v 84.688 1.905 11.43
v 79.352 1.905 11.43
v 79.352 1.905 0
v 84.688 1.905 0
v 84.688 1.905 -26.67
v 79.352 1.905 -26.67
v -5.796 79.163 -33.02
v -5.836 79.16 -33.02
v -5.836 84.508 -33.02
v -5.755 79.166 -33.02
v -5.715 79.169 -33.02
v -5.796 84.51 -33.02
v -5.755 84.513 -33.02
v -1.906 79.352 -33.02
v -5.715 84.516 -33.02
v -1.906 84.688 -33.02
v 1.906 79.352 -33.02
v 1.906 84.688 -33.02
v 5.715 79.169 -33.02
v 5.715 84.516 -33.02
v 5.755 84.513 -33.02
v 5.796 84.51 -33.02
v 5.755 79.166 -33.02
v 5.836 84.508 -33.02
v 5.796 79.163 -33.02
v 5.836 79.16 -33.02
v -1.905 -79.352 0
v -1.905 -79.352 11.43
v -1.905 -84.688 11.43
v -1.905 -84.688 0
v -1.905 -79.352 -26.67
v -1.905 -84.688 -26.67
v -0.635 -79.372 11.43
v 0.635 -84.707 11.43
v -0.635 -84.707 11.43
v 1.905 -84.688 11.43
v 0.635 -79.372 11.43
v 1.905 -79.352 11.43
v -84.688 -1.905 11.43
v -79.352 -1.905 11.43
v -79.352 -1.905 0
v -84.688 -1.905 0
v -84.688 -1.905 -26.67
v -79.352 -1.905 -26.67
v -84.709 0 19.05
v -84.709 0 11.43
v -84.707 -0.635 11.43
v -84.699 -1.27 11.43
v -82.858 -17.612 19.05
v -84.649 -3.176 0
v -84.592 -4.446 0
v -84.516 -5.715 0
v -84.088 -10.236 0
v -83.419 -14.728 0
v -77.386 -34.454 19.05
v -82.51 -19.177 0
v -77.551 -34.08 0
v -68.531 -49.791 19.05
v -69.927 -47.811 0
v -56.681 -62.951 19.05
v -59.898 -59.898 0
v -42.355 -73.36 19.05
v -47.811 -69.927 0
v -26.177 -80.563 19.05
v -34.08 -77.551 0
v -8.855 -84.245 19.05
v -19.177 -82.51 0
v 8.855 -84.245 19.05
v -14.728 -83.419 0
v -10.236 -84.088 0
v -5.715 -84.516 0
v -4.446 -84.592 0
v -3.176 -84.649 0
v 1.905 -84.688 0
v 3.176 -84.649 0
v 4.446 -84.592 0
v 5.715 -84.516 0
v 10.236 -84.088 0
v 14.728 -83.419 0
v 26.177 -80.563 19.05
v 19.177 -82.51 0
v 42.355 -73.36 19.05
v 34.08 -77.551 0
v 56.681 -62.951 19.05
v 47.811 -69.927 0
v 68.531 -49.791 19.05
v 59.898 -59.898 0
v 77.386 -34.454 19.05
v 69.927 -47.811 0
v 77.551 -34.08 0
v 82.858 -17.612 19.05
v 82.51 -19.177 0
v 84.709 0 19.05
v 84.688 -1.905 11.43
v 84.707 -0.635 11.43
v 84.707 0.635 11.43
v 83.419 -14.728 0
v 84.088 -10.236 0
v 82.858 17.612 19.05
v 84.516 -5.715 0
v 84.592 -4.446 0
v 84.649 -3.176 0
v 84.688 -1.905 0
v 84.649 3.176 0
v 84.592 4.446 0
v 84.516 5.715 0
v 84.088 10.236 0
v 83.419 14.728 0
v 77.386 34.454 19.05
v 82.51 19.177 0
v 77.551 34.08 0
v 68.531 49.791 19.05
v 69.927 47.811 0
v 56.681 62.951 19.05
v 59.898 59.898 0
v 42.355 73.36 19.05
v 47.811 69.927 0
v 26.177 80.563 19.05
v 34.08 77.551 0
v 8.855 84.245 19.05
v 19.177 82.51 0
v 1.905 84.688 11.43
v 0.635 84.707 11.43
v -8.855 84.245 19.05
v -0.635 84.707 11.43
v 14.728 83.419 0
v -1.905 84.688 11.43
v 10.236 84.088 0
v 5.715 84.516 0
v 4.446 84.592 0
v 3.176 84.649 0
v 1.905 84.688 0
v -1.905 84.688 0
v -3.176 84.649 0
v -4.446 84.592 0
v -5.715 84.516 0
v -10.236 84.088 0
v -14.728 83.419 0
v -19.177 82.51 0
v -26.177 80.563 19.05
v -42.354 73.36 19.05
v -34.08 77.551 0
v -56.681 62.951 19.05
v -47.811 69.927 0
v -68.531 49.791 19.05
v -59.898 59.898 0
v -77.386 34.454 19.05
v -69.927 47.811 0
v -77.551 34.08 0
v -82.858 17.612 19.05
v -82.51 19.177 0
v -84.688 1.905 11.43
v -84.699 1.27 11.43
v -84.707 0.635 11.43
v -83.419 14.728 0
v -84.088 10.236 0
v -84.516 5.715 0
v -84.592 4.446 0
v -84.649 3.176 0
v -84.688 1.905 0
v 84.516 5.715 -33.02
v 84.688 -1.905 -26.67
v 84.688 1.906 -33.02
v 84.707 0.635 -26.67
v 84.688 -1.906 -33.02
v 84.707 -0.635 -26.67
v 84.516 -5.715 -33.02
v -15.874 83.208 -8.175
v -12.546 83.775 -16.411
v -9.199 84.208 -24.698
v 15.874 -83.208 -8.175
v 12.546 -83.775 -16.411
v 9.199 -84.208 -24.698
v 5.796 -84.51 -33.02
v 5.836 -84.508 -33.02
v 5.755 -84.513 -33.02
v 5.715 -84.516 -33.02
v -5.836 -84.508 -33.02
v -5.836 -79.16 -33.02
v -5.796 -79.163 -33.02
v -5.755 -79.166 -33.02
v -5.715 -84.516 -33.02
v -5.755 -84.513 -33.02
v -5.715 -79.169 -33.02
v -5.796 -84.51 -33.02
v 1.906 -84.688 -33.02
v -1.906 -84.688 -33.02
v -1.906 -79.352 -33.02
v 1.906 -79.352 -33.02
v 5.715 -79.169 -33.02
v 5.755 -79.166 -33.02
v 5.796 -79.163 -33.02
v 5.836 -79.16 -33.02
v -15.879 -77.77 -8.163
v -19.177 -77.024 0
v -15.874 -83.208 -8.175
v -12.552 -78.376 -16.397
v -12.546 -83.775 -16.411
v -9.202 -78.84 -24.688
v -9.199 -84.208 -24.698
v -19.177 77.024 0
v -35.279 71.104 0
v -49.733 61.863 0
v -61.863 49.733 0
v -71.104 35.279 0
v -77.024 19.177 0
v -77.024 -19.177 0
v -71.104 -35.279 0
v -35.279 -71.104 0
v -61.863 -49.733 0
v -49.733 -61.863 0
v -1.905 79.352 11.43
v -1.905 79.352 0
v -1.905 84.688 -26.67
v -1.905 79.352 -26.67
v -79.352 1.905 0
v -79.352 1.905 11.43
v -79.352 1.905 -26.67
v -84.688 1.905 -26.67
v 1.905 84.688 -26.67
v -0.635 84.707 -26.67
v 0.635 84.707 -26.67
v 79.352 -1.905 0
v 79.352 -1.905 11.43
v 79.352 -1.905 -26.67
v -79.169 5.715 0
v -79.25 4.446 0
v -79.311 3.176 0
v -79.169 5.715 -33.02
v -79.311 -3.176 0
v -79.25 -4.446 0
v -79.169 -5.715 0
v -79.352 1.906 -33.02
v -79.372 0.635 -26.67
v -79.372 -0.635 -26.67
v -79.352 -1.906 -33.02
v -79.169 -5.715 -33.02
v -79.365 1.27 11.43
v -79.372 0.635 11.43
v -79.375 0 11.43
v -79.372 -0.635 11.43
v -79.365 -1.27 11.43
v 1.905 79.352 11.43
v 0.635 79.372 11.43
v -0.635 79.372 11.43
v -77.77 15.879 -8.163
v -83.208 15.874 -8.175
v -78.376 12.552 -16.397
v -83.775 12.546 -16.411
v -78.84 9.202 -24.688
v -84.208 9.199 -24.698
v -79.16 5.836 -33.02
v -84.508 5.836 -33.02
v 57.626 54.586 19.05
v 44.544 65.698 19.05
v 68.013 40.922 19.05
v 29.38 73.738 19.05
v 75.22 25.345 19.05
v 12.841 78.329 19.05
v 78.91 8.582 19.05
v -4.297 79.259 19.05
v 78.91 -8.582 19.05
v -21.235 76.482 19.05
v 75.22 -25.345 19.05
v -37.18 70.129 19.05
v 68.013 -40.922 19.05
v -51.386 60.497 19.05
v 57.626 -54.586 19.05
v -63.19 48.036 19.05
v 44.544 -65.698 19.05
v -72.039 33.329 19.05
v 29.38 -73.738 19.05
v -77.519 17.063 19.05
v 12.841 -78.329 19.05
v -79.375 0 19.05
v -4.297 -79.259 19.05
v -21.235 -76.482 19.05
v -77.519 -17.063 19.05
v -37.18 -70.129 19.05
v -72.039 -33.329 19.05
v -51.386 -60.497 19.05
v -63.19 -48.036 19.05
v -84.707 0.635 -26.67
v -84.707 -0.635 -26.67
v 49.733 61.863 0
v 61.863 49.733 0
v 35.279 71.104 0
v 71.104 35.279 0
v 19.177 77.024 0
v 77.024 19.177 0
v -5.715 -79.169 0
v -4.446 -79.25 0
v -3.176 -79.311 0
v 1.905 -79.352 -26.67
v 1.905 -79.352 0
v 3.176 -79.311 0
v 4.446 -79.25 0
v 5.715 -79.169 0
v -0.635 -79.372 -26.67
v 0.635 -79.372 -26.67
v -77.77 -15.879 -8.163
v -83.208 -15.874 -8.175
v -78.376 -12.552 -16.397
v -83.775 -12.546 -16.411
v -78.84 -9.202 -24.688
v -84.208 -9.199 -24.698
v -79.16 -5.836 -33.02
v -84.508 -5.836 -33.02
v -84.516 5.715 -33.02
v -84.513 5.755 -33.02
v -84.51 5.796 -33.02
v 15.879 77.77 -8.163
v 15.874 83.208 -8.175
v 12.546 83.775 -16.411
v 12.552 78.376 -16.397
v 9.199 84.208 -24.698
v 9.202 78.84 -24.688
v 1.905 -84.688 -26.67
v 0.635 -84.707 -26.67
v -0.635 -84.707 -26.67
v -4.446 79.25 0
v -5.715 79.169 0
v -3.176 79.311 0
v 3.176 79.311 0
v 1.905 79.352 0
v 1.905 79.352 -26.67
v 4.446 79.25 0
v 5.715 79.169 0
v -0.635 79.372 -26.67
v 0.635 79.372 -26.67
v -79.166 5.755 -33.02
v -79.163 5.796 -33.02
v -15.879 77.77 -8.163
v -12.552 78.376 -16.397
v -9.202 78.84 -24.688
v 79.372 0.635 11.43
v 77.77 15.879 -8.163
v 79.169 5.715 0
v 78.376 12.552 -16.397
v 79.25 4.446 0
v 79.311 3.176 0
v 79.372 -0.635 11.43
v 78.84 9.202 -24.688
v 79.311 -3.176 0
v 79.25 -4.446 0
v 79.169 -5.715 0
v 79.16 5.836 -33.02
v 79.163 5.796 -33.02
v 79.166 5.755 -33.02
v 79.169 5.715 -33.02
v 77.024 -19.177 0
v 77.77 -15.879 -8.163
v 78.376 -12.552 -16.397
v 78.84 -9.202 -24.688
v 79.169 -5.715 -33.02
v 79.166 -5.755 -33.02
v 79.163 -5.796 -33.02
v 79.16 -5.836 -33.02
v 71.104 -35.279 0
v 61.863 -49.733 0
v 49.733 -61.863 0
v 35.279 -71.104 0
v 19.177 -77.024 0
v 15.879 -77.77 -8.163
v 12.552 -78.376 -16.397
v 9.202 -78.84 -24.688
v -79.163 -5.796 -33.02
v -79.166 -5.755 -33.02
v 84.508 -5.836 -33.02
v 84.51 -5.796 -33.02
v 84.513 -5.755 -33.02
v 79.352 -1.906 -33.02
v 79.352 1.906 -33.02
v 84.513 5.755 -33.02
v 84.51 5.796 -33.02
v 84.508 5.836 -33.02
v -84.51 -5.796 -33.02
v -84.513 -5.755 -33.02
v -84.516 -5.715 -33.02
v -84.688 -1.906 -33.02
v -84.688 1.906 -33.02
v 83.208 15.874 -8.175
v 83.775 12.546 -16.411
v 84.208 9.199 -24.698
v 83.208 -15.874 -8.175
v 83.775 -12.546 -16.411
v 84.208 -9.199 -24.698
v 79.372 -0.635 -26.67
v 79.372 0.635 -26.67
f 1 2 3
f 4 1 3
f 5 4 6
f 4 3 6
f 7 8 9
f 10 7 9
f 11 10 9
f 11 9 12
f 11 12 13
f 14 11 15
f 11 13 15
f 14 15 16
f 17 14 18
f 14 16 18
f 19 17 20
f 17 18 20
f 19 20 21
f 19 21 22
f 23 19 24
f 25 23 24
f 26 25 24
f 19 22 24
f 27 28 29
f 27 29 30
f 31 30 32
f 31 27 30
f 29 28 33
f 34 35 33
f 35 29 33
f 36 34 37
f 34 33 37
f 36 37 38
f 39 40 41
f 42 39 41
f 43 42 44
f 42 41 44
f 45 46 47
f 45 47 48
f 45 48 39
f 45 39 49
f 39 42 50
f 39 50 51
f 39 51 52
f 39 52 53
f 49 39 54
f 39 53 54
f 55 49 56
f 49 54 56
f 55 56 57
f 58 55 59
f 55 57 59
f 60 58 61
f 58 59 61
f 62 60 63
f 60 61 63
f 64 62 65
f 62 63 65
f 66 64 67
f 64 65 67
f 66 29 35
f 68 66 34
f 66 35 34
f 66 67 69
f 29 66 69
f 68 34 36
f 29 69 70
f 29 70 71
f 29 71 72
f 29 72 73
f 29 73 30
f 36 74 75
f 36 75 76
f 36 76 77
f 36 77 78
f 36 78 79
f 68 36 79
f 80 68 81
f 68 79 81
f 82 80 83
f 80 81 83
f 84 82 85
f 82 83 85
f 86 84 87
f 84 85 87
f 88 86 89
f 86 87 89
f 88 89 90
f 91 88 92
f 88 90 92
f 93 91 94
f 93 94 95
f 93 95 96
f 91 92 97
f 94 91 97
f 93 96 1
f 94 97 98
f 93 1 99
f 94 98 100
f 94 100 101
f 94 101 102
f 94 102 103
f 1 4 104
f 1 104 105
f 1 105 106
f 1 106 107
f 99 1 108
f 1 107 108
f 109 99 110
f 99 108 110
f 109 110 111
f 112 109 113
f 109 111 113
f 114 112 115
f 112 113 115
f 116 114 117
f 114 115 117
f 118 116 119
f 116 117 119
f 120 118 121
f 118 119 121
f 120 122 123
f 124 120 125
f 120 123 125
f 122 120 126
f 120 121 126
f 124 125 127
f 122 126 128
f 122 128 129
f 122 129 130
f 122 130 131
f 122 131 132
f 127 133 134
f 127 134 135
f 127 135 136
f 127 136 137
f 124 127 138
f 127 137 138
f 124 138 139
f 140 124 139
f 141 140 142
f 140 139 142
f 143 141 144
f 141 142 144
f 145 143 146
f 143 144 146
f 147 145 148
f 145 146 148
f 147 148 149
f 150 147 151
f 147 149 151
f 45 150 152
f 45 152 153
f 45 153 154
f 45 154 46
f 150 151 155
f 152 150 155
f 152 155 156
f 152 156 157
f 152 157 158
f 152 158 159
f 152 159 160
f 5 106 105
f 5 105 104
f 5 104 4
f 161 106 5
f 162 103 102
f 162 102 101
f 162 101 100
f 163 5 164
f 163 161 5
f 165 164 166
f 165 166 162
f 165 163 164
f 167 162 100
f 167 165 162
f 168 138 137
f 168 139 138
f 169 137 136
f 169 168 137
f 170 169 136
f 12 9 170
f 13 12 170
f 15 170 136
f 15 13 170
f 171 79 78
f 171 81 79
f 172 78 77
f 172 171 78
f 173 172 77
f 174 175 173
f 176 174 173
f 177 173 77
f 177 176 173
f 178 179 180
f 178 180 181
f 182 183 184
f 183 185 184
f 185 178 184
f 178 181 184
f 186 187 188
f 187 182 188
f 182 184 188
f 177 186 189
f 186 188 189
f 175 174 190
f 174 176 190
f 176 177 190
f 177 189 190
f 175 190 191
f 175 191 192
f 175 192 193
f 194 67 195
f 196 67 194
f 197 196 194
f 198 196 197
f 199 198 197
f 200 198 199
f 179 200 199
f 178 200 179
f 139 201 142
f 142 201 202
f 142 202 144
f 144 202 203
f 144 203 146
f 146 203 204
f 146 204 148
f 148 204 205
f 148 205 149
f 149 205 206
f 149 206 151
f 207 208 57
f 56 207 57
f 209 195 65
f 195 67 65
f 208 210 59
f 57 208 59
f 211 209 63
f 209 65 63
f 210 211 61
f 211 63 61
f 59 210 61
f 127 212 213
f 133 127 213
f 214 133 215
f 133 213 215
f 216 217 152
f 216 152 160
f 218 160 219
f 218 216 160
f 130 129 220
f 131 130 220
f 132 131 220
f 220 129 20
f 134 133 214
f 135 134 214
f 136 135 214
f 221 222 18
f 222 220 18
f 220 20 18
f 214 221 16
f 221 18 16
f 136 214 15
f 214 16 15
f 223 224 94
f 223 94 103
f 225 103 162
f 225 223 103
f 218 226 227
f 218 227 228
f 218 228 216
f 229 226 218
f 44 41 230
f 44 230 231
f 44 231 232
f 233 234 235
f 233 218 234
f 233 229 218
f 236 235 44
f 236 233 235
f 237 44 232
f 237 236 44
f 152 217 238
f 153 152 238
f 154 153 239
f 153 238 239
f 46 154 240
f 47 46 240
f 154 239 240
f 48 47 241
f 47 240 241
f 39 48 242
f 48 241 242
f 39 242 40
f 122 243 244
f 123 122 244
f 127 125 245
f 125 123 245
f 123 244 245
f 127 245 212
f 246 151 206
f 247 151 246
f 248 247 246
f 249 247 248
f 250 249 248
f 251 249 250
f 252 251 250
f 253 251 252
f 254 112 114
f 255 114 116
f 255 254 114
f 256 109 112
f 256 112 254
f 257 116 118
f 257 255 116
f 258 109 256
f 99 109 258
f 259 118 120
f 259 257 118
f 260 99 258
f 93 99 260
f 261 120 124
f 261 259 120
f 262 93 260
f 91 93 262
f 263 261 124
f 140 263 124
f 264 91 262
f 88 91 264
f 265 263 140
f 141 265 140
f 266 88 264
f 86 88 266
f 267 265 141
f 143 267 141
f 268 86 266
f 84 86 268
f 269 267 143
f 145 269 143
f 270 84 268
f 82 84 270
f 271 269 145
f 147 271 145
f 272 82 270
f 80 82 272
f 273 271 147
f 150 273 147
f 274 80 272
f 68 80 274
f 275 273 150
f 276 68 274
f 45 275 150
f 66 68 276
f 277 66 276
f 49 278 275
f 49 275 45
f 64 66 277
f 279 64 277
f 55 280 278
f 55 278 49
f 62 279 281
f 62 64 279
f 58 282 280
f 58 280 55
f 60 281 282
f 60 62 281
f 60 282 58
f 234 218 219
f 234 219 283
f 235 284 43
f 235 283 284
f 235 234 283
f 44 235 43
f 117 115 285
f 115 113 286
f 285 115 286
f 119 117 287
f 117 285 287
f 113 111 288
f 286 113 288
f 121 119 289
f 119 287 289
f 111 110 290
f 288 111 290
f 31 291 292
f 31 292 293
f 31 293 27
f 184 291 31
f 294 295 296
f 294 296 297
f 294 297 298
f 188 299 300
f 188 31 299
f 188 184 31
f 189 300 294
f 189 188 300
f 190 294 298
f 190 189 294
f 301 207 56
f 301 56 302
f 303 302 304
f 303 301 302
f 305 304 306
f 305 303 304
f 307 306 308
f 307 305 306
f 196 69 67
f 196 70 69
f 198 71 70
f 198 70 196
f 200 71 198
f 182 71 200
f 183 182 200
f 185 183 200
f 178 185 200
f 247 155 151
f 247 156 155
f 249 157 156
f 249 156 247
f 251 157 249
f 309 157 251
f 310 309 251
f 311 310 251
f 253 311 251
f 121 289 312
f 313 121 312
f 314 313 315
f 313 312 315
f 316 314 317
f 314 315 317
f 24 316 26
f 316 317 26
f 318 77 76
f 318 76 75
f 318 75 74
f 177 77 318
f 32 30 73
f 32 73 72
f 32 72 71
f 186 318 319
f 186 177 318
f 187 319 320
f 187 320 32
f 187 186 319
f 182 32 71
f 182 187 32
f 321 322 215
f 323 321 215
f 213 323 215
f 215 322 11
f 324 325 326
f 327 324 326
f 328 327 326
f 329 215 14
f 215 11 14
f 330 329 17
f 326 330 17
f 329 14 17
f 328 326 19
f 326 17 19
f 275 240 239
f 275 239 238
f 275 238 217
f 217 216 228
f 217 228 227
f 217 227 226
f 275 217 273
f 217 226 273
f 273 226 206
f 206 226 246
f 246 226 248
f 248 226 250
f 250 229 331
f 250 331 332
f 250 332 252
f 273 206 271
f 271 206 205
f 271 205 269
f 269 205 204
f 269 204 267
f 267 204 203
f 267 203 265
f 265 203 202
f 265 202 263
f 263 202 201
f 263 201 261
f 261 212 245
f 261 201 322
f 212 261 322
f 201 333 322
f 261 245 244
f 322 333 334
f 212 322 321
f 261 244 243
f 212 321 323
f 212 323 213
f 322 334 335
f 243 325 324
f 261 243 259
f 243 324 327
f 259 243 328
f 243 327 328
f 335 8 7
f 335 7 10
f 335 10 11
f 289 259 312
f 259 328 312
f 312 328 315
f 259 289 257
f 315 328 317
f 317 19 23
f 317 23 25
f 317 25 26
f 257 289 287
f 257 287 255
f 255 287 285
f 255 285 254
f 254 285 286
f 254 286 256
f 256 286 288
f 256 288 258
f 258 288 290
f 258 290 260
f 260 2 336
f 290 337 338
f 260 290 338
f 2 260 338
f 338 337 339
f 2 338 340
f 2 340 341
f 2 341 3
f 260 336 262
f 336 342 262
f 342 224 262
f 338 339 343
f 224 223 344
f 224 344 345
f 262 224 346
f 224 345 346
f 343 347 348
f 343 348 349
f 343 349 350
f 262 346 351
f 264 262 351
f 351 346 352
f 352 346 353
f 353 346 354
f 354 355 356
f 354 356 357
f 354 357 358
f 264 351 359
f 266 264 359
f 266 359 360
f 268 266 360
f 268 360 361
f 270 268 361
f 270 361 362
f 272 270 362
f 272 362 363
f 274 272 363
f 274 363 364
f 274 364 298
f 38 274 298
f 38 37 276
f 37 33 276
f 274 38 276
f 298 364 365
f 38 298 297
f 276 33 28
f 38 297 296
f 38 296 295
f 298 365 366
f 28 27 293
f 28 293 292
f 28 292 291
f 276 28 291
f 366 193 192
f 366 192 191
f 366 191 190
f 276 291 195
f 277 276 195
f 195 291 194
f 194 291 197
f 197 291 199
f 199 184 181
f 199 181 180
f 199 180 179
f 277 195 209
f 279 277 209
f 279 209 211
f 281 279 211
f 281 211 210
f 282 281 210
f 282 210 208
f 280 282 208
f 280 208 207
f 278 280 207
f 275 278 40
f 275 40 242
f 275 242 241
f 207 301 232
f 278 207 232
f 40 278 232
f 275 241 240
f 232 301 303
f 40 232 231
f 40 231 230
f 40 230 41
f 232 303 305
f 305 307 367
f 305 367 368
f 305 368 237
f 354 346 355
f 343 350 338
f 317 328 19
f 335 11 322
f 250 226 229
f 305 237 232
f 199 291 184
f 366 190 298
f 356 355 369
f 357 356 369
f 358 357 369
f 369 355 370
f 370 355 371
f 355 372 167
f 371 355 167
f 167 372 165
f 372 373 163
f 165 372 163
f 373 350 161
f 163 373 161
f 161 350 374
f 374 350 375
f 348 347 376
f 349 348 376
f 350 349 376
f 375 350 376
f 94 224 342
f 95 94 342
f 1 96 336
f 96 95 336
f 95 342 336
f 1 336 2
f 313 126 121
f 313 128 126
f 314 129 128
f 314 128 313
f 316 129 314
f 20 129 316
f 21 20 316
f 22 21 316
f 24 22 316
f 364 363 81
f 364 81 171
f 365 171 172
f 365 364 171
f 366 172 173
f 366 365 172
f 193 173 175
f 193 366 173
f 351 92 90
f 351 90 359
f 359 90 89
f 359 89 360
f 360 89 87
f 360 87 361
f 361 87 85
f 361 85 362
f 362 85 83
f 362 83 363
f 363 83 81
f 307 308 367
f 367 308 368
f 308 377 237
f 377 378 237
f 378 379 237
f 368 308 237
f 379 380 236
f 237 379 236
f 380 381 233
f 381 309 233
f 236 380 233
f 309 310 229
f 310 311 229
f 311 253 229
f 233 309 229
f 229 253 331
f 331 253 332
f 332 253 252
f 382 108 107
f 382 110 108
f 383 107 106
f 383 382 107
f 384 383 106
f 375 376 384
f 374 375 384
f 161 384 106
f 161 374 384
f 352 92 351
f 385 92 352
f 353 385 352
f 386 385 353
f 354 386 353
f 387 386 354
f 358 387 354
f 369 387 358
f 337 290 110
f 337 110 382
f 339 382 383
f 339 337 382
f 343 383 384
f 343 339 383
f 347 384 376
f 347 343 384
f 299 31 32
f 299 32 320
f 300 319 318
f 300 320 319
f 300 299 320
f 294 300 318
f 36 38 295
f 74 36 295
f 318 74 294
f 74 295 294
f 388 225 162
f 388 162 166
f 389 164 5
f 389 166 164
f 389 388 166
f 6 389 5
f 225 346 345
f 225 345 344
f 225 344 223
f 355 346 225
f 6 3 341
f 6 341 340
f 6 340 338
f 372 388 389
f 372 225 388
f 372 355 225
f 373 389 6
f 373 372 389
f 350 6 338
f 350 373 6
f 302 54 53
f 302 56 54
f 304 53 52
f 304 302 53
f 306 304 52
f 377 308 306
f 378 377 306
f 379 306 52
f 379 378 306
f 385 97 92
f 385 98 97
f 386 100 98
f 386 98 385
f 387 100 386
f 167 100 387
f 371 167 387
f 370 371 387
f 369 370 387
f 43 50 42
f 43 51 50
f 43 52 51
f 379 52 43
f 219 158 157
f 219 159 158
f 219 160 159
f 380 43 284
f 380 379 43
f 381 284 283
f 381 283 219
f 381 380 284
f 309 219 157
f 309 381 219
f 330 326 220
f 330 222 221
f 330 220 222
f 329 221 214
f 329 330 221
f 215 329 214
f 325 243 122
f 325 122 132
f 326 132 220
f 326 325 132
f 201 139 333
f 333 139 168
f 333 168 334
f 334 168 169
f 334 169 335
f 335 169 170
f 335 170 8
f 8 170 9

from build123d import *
from build123d.topology import SkipClean

# Parameters (mm, degrees)
SKETCH1_R           = 84.709
SKETCH1_R_2         = 79.375
BOSS_EXTRUDE1_DEPTH = 19.05
BOSS_EXTRUDE2_START = 33.02
BOSS_EXTRUDE2_DEPTH = 33.02
SKETCH2_W           = 3.81
SKETCH2_H           = 38.1
CUT_EXTRUDE1_DEPTH  = 125.264032455
CIRPATTERN1_COUNT   = 4
CHAMFER1_SIZE       = 13.462
CHAMFER1_SIZE_2     = 33.319619221


with BuildPart() as part:
    # Sketch1 → Boss-Extrude1 (new body)
    with BuildSketch(Plane.XY):
        with Locations(Location((0, 0, 0), (0, 0, 180))):
            Circle(SKETCH1_R)
        with Locations(Location((0, 0, 0), (0, 0, 180))):
            Circle(SKETCH1_R_2, mode=Mode.SUBTRACT)
    extrude(amount=BOSS_EXTRUDE1_DEPTH)

    # Sketch3 → Boss-Extrude2 (add)
    with SkipClean():  # the faces are left unmerged after this step: merging them gives an invalid solid
        with BuildSketch(Plane(origin=(0, 0, 0), x_dir=(-1, 0, 0), z_dir=(0, 0, -1)).offset(BOSS_EXTRUDE2_START)):
            with BuildLine():
                Line((-5.715, 79.168992668), (-5.715, 84.515995267))
                ThreePointArc((-5.715, 84.515995267), (0, 84.709), (5.715, 84.515995267))
                Line((5.715, 84.515995267), (5.715, 79.168992668))
                ThreePointArc((5.715, 79.168992668), (0, 79.375), (-5.715, 79.168992668))
            make_face()
            with BuildLine():
                Line((-5.715, -79.168992668), (-5.715, -84.515995267))
                ThreePointArc((-5.715, -84.515995267), (0, -84.709), (5.715, -84.515995267))
                Line((5.715, -84.515995267), (5.715, -79.168992668))
                ThreePointArc((5.715, -79.168992668), (0, -79.375), (-5.715, -79.168992668))
            make_face()
            with BuildLine():
                Line((79.168992668, -5.715), (84.515995267, -5.715))
                ThreePointArc((84.515995267, -5.715), (84.709, 0), (84.515995267, 5.715))
                Line((84.515995267, 5.715), (79.168992668, 5.715))
                ThreePointArc((79.168992668, 5.715), (79.375, 0), (79.168992668, -5.715))
            make_face()
            with BuildLine():
                Line((-79.168992668, 5.715), (-84.515995267, 5.715))
                ThreePointArc((-84.515995267, 5.715), (-84.709, 0), (-84.515995267, -5.715))
                Line((-84.515995267, -5.715), (-79.168992668, -5.715))
                ThreePointArc((-79.168992668, -5.715), (-79.375, 0), (-79.168992668, 5.715))
            make_face()
        extrude(amount=-BOSS_EXTRUDE2_DEPTH)

    # Sketch2 → Cut-Extrude1 (cut, through all)
    with SkipClean():  # the faces are left unmerged after this step: merging them gives an invalid solid
        with BuildSketch(Plane(origin=(0, 0, 0), x_dir=(1, 0, 0), z_dir=(0, 1, 0))):
            with Locations((0, 7.62)):
                Rectangle(SKETCH2_W, SKETCH2_H)
        cut_extrude1 = extrude(amount=-CUT_EXTRUDE1_DEPTH, mode=Mode.SUBTRACT)

    # CirPattern1: Cut-Extrude1 ×4 about axis
    with SkipClean():  # the faces are left unmerged after this step: merging them gives an invalid solid
        cirpattern1_axis = Axis((0, 0, 0), (0, 0, 1))
        for i in range(1, CIRPATTERN1_COUNT):
            add(cut_extrude1.rotate(cirpattern1_axis, i * 360 / CIRPATTERN1_COUNT), mode=Mode.SUBTRACT)

    # Chamfer1
    # the kernel refuses this chamfer: 33.319619221, 13.462 mm, written as the material it adds along each edge
    with BuildSketch(Plane(origin=(-5.715, 170.913401218, 0), x_dir=(-0.9961057015681392, 0, 0.08816706473193561), z_dir=(0, -1, 0))) as chamfer1_piece_1_section:
        Polygon((CHAMFER1_SIZE * 0.996105701568, CHAMFER1_SIZE * 0.0881670647319), (-CHAMFER1_SIZE_2 * 0.0881670647311, CHAMFER1_SIZE_2 * 0.996105701559), (0, 0), align=None)
    chamfer1_piece_1 = extrude(amount=178.141814502, mode=Mode.PRIVATE)
    chamfer1_piece_1 = chamfer1_piece_1 & Plane(origin=(0, 0, -11.191625659), x_dir=(-1, 0, 0), z_dir=(0, 0, -1)) * Cylinder(84.709, 490, mode=Mode.PRIVATE)
    chamfer1_piece_1 = chamfer1_piece_1 - Plane(origin=(0, 0, -11.191625659), x_dir=(-1, 0, 0), z_dir=(0, 0, -1)) * Cylinder(79.375, 490, mode=Mode.PRIVATE)
    chamfer1_piece_1 = split(chamfer1_piece_1, bisect_by=Plane(origin=(-9.949714127, 81.358468366, -33.02), z_dir=(0, 0, 1)), keep=Keep.TOP, mode=Mode.PRIVATE)
    add(chamfer1_piece_1)
    with BuildSketch(Plane(origin=(-170.913401218, 5.715, 0), x_dir=(1.3071407043529467e-14, 0.9961057015681392, 0.08816706473193561), z_dir=(1, 0, 0))) as chamfer1_piece_2_section:
        Polygon((CHAMFER1_SIZE * 0.996105701568, -CHAMFER1_SIZE * 0.0881670647319), (-CHAMFER1_SIZE_2 * 0.0881670647311, -CHAMFER1_SIZE_2 * 0.996105701559), (0, 0), align=None)
    chamfer1_piece_2 = extrude(amount=178.141814502, mode=Mode.PRIVATE)
    chamfer1_piece_2 = chamfer1_piece_2 & Plane(origin=(0, 0, -11.191625637), x_dir=(-1, 0, 0), z_dir=(0, 0, -1)) * Cylinder(84.709, 490, mode=Mode.PRIVATE)
    chamfer1_piece_2 = chamfer1_piece_2 - Plane(origin=(0, 0, -11.191625637), x_dir=(-1, 0, 0), z_dir=(0, 0, -1)) * Cylinder(79.375, 490, mode=Mode.PRIVATE)
    chamfer1_piece_2 = split(chamfer1_piece_2, bisect_by=Plane(origin=(-81.358468349, 9.949714129, -33.02), z_dir=(0, 0, 1)), keep=Keep.TOP, mode=Mode.PRIVATE)
    add(chamfer1_piece_2)
    with BuildSketch(Plane(origin=(5.715, -7.228413283, 0), x_dir=(0.9961057015681392, 0, 0.08816706473193561), z_dir=(0, 1, 0))) as chamfer1_piece_3_section:
        Polygon((CHAMFER1_SIZE * 0.996105701568, CHAMFER1_SIZE * 0.0881670647319), (-CHAMFER1_SIZE_2 * 0.0881670647311, CHAMFER1_SIZE_2 * 0.996105701559), (0, 0), align=None)
    chamfer1_piece_3 = extrude(amount=178.141814502, mode=Mode.PRIVATE)
    chamfer1_piece_3 = chamfer1_piece_3 & Plane(origin=(0, 0, -11.191625637), x_dir=(-1, 0, 0), z_dir=(0, 0, -1)) * Cylinder(84.709, 490, mode=Mode.PRIVATE)
    chamfer1_piece_3 = chamfer1_piece_3 - Plane(origin=(0, 0, -11.191625637), x_dir=(-1, 0, 0), z_dir=(0, 0, -1)) * Cylinder(79.375, 490, mode=Mode.PRIVATE)
    chamfer1_piece_3 = split(chamfer1_piece_3, bisect_by=Plane(origin=(9.949714129, 81.358468349, -33.02), z_dir=(0, 0, 1)), keep=Keep.TOP, mode=Mode.PRIVATE)
    add(chamfer1_piece_3)
    with BuildSketch(Plane(origin=(-7.228413283, 5.715, 0), x_dir=(-1.3071407043529467e-14, 0.9961057015681392, 0.08816706473193563), z_dir=(1, 0, 0))) as chamfer1_piece_4_section:
        Polygon((CHAMFER1_SIZE * 0.996105701568, -CHAMFER1_SIZE * 0.0881670647319), (-CHAMFER1_SIZE_2 * 0.0881670647311, -CHAMFER1_SIZE_2 * 0.996105701559), (0, 0), align=None)
    chamfer1_piece_4 = extrude(amount=178.141814502, mode=Mode.PRIVATE)
    chamfer1_piece_4 = chamfer1_piece_4 & Plane(origin=(0, 0, -11.191625658), x_dir=(-1, 0, 0), z_dir=(0, 0, -1)) * Cylinder(84.709, 490, mode=Mode.PRIVATE)
    chamfer1_piece_4 = chamfer1_piece_4 - Plane(origin=(0, 0, -11.191625658), x_dir=(-1, 0, 0), z_dir=(0, 0, -1)) * Cylinder(79.375, 490, mode=Mode.PRIVATE)
    chamfer1_piece_4 = split(chamfer1_piece_4, bisect_by=Plane(origin=(81.358468366, 9.949714127, -33.02), z_dir=(0, 0, 1)), keep=Keep.TOP, mode=Mode.PRIVATE)
    add(chamfer1_piece_4)
    with BuildSketch(Plane(origin=(-5.715, -170.913401218, 0), x_dir=(-0.9961057015681392, 0, 0.08816706473193561), z_dir=(0, 1, 0))) as chamfer1_piece_5_section:
        Polygon((CHAMFER1_SIZE * 0.996105701568, -CHAMFER1_SIZE * 0.0881670647319), (-CHAMFER1_SIZE_2 * 0.0881670647311, -CHAMFER1_SIZE_2 * 0.996105701559), (0, 0), align=None)
    chamfer1_piece_5 = extrude(amount=178.141814502, mode=Mode.PRIVATE)
    chamfer1_piece_5 = chamfer1_piece_5 & Plane(origin=(0, 0, -11.191625637), x_dir=(-1, 0, 0), z_dir=(0, 0, -1)) * Cylinder(84.709, 490, mode=Mode.PRIVATE)
    chamfer1_piece_5 = chamfer1_piece_5 - Plane(origin=(0, 0, -11.191625637), x_dir=(-1, 0, 0), z_dir=(0, 0, -1)) * Cylinder(79.375, 490, mode=Mode.PRIVATE)
    chamfer1_piece_5 = split(chamfer1_piece_5, bisect_by=Plane(origin=(-9.949714129, -81.358468349, -33.02), z_dir=(0, 0, 1)), keep=Keep.TOP, mode=Mode.PRIVATE)
    add(chamfer1_piece_5)
    with BuildSketch(Plane(origin=(7.228413283, -5.715, 0), x_dir=(-1.5553319773313542e-14, -0.9961057015681392, 0.08816706473193561), z_dir=(-1, 0, 0))) as chamfer1_piece_6_section:
        Polygon((CHAMFER1_SIZE * 0.996105701568, -CHAMFER1_SIZE * 0.0881670647319), (-CHAMFER1_SIZE_2 * 0.0881670647311, -CHAMFER1_SIZE_2 * 0.996105701559), (0, 0), align=None)
    chamfer1_piece_6 = extrude(amount=178.141814502, mode=Mode.PRIVATE)
    chamfer1_piece_6 = chamfer1_piece_6 & Plane(origin=(0, 0, -11.191625659), x_dir=(-1, 0, 0), z_dir=(0, 0, -1)) * Cylinder(84.709, 490, mode=Mode.PRIVATE)
    chamfer1_piece_6 = chamfer1_piece_6 - Plane(origin=(0, 0, -11.191625659), x_dir=(-1, 0, 0), z_dir=(0, 0, -1)) * Cylinder(79.375, 490, mode=Mode.PRIVATE)
    chamfer1_piece_6 = split(chamfer1_piece_6, bisect_by=Plane(origin=(-81.358468366, -9.949714127, -33.02), z_dir=(0, 0, 1)), keep=Keep.TOP, mode=Mode.PRIVATE)
    add(chamfer1_piece_6)
    with BuildSketch(Plane(origin=(5.715, 7.228413283, 0), x_dir=(0.9961057015681392, 0, 0.08816706473193563), z_dir=(0, -1, 0))) as chamfer1_piece_7_section:
        Polygon((CHAMFER1_SIZE * 0.996105701568, -CHAMFER1_SIZE * 0.0881670647319), (-CHAMFER1_SIZE_2 * 0.0881670647311, -CHAMFER1_SIZE_2 * 0.996105701559), (0, 0), align=None)
    chamfer1_piece_7 = extrude(amount=178.141814502, mode=Mode.PRIVATE)
    chamfer1_piece_7 = chamfer1_piece_7 & Plane(origin=(0, 0, -11.191625659), x_dir=(-1, 0, 0), z_dir=(0, 0, -1)) * Cylinder(84.709, 490, mode=Mode.PRIVATE)
    chamfer1_piece_7 = chamfer1_piece_7 - Plane(origin=(0, 0, -11.191625659), x_dir=(-1, 0, 0), z_dir=(0, 0, -1)) * Cylinder(79.375, 490, mode=Mode.PRIVATE)
    chamfer1_piece_7 = split(chamfer1_piece_7, bisect_by=Plane(origin=(9.949714127, -81.358468366, -33.02), z_dir=(0, 0, 1)), keep=Keep.TOP, mode=Mode.PRIVATE)
    add(chamfer1_piece_7)
    with BuildSketch(Plane(origin=(170.913401218, -5.715, 0), x_dir=(1.555331977331354e-14, -0.9961057015681392, 0.08816706473193561), z_dir=(-1, 0, 0))) as chamfer1_piece_8_section:
        Polygon((CHAMFER1_SIZE * 0.996105701568, -CHAMFER1_SIZE * 0.0881670647319), (-CHAMFER1_SIZE_2 * 0.0881670647311, -CHAMFER1_SIZE_2 * 0.996105701559), (0, 0), align=None)
    chamfer1_piece_8 = extrude(amount=178.141814502, mode=Mode.PRIVATE)
    chamfer1_piece_8 = chamfer1_piece_8 & Plane(origin=(0, 0, -11.191625637), x_dir=(-1, 0, 0), z_dir=(0, 0, -1)) * Cylinder(84.709, 490, mode=Mode.PRIVATE)
    chamfer1_piece_8 = chamfer1_piece_8 - Plane(origin=(0, 0, -11.191625637), x_dir=(-1, 0, 0), z_dir=(0, 0, -1)) * Cylinder(79.375, 490, mode=Mode.PRIVATE)
    chamfer1_piece_8 = split(chamfer1_piece_8, bisect_by=Plane(origin=(81.358468349, -9.949714129, -33.02), z_dir=(0, 0, 1)), keep=Keep.TOP, mode=Mode.PRIVATE)
    add(chamfer1_piece_8)


solid = part.part
